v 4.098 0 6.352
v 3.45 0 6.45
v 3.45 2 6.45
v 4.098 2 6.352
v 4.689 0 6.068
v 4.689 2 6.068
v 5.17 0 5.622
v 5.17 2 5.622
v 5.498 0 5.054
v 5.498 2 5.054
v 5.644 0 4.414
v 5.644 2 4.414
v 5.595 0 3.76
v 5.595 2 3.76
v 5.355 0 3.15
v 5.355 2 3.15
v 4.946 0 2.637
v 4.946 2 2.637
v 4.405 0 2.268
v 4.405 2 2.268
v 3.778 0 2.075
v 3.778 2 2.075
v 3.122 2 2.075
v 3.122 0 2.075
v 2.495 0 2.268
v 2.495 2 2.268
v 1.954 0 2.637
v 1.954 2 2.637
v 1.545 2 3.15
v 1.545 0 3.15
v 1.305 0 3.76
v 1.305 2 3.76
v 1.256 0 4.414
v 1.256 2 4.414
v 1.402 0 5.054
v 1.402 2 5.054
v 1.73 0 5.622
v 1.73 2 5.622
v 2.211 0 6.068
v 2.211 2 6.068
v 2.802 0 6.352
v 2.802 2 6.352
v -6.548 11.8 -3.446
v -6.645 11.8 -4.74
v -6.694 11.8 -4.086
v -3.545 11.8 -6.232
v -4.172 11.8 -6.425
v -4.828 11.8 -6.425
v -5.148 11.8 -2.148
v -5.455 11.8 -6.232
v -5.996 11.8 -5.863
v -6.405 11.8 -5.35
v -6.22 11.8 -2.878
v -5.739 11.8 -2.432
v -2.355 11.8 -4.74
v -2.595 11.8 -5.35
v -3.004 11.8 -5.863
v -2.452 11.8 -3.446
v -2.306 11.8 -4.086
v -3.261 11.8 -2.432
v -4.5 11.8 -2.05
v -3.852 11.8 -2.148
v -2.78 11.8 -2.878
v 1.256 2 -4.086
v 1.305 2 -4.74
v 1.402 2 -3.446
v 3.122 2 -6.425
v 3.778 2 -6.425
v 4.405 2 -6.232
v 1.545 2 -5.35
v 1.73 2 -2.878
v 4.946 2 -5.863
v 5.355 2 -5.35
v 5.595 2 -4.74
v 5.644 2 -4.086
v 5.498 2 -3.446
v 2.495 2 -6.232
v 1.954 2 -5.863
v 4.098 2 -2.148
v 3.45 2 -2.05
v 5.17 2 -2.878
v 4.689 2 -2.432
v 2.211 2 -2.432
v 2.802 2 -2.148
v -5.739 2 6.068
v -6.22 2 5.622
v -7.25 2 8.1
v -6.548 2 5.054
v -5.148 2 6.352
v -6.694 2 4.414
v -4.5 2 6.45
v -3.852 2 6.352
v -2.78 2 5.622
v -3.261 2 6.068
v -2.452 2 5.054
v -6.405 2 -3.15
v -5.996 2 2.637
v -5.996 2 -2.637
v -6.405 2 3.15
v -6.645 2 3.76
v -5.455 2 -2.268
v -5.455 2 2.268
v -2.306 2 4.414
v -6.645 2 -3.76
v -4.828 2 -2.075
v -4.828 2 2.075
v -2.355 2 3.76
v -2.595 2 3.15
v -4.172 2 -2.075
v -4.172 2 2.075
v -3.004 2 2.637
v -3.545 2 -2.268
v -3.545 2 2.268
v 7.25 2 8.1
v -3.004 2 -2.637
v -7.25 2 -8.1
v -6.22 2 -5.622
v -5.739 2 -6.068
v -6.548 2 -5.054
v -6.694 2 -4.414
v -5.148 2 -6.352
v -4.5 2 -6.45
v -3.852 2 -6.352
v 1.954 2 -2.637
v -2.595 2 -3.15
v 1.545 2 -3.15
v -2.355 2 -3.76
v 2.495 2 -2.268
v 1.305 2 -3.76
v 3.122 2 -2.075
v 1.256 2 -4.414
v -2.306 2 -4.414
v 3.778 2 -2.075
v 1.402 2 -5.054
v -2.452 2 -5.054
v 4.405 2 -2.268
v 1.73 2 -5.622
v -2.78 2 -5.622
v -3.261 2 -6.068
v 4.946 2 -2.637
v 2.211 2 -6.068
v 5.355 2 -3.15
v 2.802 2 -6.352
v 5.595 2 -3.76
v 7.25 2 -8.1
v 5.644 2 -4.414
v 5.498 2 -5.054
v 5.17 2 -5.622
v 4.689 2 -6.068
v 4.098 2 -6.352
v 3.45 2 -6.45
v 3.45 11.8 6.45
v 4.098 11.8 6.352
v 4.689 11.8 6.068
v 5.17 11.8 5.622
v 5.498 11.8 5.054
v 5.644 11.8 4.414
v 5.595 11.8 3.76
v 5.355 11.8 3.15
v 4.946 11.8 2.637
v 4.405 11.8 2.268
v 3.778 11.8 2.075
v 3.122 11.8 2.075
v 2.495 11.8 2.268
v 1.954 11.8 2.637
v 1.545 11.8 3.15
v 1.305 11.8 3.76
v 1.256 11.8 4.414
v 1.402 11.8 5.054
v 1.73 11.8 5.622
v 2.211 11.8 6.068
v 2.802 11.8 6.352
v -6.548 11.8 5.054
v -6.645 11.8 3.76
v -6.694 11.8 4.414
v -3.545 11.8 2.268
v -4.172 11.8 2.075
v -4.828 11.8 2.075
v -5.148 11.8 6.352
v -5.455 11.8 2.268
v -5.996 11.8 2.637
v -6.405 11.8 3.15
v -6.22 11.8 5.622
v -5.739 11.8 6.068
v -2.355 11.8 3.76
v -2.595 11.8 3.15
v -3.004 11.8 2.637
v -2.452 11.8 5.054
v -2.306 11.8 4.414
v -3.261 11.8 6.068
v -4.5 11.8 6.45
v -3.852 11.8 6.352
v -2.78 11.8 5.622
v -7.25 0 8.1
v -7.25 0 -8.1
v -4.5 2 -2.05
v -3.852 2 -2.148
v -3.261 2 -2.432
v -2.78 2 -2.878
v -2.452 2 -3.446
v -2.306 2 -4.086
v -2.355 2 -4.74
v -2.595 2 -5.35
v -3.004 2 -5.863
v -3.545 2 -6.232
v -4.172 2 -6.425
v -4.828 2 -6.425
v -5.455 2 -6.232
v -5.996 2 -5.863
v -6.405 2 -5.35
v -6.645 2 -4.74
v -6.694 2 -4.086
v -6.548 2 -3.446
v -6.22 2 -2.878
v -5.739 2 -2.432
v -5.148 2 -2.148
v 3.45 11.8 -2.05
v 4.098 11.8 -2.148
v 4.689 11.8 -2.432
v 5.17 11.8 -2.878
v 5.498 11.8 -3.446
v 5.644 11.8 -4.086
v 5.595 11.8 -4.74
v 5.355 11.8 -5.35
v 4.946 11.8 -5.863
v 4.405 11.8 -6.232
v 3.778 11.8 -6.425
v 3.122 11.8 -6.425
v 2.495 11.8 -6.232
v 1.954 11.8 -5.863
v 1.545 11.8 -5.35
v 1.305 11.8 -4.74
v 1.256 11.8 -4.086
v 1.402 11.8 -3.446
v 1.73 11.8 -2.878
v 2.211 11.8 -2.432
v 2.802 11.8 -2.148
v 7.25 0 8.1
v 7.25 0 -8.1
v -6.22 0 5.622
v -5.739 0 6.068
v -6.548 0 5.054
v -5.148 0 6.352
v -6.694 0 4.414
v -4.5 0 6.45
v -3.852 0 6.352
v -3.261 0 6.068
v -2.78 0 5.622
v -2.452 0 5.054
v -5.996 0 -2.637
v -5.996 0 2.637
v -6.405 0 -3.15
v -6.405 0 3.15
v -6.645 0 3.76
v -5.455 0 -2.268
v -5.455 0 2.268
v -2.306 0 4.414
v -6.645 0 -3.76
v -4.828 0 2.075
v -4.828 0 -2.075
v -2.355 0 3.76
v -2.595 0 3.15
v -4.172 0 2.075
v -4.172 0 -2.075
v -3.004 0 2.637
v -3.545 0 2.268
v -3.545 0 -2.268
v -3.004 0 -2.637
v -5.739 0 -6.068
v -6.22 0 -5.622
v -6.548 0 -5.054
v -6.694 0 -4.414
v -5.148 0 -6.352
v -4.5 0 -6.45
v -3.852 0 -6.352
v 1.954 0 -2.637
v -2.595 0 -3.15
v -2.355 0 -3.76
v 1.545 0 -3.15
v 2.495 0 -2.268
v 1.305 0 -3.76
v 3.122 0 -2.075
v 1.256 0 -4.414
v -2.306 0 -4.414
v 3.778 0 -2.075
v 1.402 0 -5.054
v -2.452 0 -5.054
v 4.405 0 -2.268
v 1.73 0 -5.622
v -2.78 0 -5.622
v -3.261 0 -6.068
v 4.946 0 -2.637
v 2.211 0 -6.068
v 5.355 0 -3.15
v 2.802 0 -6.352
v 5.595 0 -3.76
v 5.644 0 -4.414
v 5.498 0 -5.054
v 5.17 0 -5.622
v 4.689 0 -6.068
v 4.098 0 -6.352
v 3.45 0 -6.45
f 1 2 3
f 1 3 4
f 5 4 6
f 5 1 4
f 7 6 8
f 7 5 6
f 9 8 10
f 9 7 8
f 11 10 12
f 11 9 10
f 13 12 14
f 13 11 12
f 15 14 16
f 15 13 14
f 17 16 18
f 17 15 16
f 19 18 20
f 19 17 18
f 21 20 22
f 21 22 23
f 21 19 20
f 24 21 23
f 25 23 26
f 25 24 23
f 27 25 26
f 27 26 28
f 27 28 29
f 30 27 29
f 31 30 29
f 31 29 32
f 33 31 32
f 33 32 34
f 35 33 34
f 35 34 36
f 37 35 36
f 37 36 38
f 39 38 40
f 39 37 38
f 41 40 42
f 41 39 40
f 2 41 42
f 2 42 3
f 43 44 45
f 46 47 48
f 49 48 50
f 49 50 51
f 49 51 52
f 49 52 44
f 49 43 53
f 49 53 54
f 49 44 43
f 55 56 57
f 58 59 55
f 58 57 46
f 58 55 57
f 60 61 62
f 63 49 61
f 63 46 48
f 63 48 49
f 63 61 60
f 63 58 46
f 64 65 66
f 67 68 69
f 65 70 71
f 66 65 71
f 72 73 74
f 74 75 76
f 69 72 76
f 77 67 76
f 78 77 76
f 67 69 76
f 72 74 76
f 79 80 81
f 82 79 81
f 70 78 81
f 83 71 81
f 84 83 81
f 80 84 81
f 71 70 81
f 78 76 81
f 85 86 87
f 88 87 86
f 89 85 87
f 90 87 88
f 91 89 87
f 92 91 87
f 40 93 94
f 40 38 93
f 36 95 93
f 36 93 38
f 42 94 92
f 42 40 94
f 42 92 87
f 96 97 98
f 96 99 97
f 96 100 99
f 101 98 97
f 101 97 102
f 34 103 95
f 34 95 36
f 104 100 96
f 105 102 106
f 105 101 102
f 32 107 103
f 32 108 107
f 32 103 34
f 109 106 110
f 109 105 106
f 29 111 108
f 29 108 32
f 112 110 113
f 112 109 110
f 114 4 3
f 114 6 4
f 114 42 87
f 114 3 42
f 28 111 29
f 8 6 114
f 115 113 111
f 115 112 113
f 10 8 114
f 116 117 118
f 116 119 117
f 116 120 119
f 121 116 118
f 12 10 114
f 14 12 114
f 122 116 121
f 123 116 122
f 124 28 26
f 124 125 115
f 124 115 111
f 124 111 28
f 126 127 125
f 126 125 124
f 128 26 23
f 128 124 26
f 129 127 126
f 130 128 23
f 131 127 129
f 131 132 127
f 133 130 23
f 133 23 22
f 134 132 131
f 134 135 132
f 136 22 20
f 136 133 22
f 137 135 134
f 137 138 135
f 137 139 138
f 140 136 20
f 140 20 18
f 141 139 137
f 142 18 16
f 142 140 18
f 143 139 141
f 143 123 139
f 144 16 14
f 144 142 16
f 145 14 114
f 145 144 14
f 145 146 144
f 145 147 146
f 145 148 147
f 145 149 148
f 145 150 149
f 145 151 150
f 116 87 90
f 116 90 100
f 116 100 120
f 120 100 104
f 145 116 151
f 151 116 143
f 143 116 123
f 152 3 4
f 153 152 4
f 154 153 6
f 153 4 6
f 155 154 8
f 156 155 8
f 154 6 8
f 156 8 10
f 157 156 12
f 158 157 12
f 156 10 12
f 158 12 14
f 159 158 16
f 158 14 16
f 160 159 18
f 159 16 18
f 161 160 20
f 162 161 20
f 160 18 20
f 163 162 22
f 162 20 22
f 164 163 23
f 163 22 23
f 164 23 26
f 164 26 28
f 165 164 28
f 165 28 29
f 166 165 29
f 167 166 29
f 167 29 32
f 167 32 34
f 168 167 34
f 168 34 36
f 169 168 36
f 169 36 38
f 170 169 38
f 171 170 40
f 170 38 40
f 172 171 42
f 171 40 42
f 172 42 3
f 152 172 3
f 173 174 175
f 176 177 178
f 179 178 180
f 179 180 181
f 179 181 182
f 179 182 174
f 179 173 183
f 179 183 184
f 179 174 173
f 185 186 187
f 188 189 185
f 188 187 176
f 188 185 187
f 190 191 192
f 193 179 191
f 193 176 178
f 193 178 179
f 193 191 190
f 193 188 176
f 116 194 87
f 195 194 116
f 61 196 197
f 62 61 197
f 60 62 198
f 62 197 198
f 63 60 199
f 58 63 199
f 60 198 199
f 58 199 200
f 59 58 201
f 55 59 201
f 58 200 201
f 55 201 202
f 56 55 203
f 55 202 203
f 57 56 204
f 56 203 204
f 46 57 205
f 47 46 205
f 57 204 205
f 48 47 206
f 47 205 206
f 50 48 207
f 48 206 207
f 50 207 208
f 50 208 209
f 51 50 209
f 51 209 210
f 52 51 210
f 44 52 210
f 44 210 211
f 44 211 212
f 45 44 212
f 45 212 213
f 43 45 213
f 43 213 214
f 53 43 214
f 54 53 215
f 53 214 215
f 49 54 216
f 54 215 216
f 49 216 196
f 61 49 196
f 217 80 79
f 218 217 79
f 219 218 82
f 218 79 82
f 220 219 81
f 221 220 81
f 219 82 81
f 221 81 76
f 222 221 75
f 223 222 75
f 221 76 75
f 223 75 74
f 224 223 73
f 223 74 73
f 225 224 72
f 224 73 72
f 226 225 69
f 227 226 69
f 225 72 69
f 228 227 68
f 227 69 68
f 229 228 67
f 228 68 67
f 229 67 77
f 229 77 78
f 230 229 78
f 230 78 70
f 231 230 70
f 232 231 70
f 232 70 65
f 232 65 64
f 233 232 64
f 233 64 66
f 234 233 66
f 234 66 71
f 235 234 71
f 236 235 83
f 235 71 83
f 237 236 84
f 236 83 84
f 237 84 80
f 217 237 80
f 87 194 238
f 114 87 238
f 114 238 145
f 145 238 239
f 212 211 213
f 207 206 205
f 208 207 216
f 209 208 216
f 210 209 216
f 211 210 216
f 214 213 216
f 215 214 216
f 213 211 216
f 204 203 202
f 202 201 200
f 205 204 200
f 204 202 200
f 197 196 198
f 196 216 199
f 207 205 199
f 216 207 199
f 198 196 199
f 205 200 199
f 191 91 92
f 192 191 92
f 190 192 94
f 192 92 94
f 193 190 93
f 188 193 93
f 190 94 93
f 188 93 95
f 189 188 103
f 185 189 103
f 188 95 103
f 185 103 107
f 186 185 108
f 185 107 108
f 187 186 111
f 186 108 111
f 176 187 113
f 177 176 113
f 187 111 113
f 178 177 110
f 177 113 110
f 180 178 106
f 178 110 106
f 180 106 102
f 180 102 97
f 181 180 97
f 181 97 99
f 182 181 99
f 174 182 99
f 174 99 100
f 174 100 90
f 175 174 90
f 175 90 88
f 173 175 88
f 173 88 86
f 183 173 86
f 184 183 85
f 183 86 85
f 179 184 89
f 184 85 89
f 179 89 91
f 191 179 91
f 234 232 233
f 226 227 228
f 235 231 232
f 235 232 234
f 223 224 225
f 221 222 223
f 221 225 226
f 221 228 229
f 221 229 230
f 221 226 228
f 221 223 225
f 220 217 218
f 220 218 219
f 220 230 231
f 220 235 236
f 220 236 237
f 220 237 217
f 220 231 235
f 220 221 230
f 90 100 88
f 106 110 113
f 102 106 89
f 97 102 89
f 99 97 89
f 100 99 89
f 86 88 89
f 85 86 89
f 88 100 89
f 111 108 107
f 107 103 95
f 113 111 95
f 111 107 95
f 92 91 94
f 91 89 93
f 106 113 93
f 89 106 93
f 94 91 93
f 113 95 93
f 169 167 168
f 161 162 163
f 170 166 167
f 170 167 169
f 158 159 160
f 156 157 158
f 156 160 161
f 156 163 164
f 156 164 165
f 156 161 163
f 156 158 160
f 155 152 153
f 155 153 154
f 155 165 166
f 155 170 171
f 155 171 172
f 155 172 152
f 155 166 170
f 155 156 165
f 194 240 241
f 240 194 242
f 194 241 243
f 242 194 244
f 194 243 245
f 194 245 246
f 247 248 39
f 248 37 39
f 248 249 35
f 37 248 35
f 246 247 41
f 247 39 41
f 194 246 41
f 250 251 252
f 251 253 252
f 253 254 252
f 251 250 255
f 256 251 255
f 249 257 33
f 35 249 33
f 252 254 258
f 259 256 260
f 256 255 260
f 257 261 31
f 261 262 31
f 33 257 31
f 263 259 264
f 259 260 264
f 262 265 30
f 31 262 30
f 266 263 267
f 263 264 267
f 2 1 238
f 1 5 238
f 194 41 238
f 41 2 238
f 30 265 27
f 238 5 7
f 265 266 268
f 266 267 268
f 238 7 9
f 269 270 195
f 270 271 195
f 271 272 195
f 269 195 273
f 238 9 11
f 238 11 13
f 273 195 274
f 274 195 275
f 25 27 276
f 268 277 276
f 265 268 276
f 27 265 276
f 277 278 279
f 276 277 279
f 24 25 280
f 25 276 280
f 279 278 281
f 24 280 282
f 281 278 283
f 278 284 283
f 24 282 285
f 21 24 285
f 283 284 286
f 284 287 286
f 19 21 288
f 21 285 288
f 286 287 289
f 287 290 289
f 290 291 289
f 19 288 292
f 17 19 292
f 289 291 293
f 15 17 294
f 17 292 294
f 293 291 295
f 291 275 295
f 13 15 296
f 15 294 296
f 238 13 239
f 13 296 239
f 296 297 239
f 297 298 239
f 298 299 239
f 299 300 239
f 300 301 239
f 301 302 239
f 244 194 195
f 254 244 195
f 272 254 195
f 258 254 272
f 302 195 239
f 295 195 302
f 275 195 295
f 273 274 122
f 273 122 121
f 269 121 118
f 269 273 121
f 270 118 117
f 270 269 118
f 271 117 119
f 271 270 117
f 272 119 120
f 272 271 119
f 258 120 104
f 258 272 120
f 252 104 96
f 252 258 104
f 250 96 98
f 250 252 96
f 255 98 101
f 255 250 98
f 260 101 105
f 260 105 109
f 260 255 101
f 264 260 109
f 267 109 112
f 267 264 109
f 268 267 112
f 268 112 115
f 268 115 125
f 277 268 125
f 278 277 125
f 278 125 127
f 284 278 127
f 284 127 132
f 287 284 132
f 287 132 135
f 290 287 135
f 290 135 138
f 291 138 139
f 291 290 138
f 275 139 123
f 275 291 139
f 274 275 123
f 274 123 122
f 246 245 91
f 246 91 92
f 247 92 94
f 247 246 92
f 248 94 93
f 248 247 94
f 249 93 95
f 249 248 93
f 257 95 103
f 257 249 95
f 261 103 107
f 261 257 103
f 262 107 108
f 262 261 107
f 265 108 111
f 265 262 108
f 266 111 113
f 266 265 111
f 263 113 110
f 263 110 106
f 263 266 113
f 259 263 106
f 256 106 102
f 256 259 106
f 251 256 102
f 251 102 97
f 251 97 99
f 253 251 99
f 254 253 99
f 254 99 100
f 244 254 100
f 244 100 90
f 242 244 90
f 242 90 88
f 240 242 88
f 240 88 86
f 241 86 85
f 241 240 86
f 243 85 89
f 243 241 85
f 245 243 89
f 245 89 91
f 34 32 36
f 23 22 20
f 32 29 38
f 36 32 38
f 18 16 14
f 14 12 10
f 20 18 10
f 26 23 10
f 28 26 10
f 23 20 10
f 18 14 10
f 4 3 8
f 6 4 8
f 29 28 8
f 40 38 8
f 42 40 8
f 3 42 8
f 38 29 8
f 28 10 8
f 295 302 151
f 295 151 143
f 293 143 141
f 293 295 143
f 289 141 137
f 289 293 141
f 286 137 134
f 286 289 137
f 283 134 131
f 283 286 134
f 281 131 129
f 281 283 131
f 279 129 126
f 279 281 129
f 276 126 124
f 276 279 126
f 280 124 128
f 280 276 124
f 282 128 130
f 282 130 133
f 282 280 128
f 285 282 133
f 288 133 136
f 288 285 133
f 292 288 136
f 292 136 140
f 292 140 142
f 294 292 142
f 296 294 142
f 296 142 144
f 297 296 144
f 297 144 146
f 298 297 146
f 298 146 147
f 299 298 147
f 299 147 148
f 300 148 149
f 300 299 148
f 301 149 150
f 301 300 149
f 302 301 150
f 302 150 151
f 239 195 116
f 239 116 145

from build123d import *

# Parameters (mm, degrees)
SKETCH1_W             = 14.5
SKETCH1_H             = 16.2
SKETCH1_R             = 2.2
BOSS_EXTRUDE2_DEPTH   = 2
SKETCH2_R             = 2.2
BOSS_EXTRUDE3_DEPTH   = 9.8
BOSS_EXTRUDE3_2_DEPTH = 9.8
BOSS_EXTRUDE3_3_DEPTH = 9.8
BOSS_EXTRUDE3_4_DEPTH = 9.8


with BuildPart() as part:
    # Sketch1 → Boss-Extrude2 (new body)
    with BuildSketch(Plane(origin=(0, 0, 0), x_dir=(1, 0, 0), z_dir=(0, 1, 0))):
        Rectangle(SKETCH1_W, SKETCH1_H)
        with Locations(Location((3.45, -4.25, 0), (0, 0, 270))):
            Circle(SKETCH1_R, mode=Mode.SUBTRACT)
        with Locations(Location((-4.5, -4.25, 0), (0, 0, 270))):
            Circle(SKETCH1_R, mode=Mode.SUBTRACT)
        with Locations(Location((-4.5, 4.25, 0), (0, 0, 90))):
            Circle(SKETCH1_R, mode=Mode.SUBTRACT)
        with Locations(Location((3.45, 4.25, 0), (0, 0, 90))):
            Circle(SKETCH1_R, mode=Mode.SUBTRACT)
    extrude(amount=BOSS_EXTRUDE2_DEPTH)


with BuildPart() as body_2:
    # Sketch2 → Boss-Extrude3 (new body)
    with BuildSketch(Plane(origin=(0, 2, 0), x_dir=(1, 0, 0), z_dir=(0, 1, 0))):
        with Locations(Location((3.45, 4.25, 0), (0, 0, 270))):
            Circle(SKETCH2_R)
    extrude(amount=BOSS_EXTRUDE3_DEPTH)


with BuildPart() as body_3:
    # Sketch2 → Boss-Extrude3 2 (new body)
    with BuildSketch(Plane(origin=(0, 2, 0), x_dir=(1, 0, 0), z_dir=(0, 1, 0))):
        with Locations(Location((-4.5, 4.25, 0), (0, 0, 270))):
            Circle(SKETCH2_R)
    extrude(amount=BOSS_EXTRUDE3_2_DEPTH)


with BuildPart() as body_4:
    # Sketch2 → Boss-Extrude3 3 (new body)
    with BuildSketch(Plane(origin=(0, 2, 0), x_dir=(1, 0, 0), z_dir=(0, 1, 0))):
        with Locations(Location((3.45, -4.25, 0), (0, 0, 270))):
            Circle(SKETCH2_R)
    extrude(amount=BOSS_EXTRUDE3_3_DEPTH)


with BuildPart() as body_5:
    # Sketch2 → Boss-Extrude3 4 (new body)
    with BuildSketch(Plane(origin=(0, 2, 0), x_dir=(1, 0, 0), z_dir=(0, 1, 0))):
        with Locations(Location((-4.5, -4.25, 0), (0, 0, 270))):
            Circle(SKETCH2_R)
    extrude(amount=BOSS_EXTRUDE3_4_DEPTH)


solid = Compound([part.part, body_2.part, body_3.part, body_4.part, body_5.part])
